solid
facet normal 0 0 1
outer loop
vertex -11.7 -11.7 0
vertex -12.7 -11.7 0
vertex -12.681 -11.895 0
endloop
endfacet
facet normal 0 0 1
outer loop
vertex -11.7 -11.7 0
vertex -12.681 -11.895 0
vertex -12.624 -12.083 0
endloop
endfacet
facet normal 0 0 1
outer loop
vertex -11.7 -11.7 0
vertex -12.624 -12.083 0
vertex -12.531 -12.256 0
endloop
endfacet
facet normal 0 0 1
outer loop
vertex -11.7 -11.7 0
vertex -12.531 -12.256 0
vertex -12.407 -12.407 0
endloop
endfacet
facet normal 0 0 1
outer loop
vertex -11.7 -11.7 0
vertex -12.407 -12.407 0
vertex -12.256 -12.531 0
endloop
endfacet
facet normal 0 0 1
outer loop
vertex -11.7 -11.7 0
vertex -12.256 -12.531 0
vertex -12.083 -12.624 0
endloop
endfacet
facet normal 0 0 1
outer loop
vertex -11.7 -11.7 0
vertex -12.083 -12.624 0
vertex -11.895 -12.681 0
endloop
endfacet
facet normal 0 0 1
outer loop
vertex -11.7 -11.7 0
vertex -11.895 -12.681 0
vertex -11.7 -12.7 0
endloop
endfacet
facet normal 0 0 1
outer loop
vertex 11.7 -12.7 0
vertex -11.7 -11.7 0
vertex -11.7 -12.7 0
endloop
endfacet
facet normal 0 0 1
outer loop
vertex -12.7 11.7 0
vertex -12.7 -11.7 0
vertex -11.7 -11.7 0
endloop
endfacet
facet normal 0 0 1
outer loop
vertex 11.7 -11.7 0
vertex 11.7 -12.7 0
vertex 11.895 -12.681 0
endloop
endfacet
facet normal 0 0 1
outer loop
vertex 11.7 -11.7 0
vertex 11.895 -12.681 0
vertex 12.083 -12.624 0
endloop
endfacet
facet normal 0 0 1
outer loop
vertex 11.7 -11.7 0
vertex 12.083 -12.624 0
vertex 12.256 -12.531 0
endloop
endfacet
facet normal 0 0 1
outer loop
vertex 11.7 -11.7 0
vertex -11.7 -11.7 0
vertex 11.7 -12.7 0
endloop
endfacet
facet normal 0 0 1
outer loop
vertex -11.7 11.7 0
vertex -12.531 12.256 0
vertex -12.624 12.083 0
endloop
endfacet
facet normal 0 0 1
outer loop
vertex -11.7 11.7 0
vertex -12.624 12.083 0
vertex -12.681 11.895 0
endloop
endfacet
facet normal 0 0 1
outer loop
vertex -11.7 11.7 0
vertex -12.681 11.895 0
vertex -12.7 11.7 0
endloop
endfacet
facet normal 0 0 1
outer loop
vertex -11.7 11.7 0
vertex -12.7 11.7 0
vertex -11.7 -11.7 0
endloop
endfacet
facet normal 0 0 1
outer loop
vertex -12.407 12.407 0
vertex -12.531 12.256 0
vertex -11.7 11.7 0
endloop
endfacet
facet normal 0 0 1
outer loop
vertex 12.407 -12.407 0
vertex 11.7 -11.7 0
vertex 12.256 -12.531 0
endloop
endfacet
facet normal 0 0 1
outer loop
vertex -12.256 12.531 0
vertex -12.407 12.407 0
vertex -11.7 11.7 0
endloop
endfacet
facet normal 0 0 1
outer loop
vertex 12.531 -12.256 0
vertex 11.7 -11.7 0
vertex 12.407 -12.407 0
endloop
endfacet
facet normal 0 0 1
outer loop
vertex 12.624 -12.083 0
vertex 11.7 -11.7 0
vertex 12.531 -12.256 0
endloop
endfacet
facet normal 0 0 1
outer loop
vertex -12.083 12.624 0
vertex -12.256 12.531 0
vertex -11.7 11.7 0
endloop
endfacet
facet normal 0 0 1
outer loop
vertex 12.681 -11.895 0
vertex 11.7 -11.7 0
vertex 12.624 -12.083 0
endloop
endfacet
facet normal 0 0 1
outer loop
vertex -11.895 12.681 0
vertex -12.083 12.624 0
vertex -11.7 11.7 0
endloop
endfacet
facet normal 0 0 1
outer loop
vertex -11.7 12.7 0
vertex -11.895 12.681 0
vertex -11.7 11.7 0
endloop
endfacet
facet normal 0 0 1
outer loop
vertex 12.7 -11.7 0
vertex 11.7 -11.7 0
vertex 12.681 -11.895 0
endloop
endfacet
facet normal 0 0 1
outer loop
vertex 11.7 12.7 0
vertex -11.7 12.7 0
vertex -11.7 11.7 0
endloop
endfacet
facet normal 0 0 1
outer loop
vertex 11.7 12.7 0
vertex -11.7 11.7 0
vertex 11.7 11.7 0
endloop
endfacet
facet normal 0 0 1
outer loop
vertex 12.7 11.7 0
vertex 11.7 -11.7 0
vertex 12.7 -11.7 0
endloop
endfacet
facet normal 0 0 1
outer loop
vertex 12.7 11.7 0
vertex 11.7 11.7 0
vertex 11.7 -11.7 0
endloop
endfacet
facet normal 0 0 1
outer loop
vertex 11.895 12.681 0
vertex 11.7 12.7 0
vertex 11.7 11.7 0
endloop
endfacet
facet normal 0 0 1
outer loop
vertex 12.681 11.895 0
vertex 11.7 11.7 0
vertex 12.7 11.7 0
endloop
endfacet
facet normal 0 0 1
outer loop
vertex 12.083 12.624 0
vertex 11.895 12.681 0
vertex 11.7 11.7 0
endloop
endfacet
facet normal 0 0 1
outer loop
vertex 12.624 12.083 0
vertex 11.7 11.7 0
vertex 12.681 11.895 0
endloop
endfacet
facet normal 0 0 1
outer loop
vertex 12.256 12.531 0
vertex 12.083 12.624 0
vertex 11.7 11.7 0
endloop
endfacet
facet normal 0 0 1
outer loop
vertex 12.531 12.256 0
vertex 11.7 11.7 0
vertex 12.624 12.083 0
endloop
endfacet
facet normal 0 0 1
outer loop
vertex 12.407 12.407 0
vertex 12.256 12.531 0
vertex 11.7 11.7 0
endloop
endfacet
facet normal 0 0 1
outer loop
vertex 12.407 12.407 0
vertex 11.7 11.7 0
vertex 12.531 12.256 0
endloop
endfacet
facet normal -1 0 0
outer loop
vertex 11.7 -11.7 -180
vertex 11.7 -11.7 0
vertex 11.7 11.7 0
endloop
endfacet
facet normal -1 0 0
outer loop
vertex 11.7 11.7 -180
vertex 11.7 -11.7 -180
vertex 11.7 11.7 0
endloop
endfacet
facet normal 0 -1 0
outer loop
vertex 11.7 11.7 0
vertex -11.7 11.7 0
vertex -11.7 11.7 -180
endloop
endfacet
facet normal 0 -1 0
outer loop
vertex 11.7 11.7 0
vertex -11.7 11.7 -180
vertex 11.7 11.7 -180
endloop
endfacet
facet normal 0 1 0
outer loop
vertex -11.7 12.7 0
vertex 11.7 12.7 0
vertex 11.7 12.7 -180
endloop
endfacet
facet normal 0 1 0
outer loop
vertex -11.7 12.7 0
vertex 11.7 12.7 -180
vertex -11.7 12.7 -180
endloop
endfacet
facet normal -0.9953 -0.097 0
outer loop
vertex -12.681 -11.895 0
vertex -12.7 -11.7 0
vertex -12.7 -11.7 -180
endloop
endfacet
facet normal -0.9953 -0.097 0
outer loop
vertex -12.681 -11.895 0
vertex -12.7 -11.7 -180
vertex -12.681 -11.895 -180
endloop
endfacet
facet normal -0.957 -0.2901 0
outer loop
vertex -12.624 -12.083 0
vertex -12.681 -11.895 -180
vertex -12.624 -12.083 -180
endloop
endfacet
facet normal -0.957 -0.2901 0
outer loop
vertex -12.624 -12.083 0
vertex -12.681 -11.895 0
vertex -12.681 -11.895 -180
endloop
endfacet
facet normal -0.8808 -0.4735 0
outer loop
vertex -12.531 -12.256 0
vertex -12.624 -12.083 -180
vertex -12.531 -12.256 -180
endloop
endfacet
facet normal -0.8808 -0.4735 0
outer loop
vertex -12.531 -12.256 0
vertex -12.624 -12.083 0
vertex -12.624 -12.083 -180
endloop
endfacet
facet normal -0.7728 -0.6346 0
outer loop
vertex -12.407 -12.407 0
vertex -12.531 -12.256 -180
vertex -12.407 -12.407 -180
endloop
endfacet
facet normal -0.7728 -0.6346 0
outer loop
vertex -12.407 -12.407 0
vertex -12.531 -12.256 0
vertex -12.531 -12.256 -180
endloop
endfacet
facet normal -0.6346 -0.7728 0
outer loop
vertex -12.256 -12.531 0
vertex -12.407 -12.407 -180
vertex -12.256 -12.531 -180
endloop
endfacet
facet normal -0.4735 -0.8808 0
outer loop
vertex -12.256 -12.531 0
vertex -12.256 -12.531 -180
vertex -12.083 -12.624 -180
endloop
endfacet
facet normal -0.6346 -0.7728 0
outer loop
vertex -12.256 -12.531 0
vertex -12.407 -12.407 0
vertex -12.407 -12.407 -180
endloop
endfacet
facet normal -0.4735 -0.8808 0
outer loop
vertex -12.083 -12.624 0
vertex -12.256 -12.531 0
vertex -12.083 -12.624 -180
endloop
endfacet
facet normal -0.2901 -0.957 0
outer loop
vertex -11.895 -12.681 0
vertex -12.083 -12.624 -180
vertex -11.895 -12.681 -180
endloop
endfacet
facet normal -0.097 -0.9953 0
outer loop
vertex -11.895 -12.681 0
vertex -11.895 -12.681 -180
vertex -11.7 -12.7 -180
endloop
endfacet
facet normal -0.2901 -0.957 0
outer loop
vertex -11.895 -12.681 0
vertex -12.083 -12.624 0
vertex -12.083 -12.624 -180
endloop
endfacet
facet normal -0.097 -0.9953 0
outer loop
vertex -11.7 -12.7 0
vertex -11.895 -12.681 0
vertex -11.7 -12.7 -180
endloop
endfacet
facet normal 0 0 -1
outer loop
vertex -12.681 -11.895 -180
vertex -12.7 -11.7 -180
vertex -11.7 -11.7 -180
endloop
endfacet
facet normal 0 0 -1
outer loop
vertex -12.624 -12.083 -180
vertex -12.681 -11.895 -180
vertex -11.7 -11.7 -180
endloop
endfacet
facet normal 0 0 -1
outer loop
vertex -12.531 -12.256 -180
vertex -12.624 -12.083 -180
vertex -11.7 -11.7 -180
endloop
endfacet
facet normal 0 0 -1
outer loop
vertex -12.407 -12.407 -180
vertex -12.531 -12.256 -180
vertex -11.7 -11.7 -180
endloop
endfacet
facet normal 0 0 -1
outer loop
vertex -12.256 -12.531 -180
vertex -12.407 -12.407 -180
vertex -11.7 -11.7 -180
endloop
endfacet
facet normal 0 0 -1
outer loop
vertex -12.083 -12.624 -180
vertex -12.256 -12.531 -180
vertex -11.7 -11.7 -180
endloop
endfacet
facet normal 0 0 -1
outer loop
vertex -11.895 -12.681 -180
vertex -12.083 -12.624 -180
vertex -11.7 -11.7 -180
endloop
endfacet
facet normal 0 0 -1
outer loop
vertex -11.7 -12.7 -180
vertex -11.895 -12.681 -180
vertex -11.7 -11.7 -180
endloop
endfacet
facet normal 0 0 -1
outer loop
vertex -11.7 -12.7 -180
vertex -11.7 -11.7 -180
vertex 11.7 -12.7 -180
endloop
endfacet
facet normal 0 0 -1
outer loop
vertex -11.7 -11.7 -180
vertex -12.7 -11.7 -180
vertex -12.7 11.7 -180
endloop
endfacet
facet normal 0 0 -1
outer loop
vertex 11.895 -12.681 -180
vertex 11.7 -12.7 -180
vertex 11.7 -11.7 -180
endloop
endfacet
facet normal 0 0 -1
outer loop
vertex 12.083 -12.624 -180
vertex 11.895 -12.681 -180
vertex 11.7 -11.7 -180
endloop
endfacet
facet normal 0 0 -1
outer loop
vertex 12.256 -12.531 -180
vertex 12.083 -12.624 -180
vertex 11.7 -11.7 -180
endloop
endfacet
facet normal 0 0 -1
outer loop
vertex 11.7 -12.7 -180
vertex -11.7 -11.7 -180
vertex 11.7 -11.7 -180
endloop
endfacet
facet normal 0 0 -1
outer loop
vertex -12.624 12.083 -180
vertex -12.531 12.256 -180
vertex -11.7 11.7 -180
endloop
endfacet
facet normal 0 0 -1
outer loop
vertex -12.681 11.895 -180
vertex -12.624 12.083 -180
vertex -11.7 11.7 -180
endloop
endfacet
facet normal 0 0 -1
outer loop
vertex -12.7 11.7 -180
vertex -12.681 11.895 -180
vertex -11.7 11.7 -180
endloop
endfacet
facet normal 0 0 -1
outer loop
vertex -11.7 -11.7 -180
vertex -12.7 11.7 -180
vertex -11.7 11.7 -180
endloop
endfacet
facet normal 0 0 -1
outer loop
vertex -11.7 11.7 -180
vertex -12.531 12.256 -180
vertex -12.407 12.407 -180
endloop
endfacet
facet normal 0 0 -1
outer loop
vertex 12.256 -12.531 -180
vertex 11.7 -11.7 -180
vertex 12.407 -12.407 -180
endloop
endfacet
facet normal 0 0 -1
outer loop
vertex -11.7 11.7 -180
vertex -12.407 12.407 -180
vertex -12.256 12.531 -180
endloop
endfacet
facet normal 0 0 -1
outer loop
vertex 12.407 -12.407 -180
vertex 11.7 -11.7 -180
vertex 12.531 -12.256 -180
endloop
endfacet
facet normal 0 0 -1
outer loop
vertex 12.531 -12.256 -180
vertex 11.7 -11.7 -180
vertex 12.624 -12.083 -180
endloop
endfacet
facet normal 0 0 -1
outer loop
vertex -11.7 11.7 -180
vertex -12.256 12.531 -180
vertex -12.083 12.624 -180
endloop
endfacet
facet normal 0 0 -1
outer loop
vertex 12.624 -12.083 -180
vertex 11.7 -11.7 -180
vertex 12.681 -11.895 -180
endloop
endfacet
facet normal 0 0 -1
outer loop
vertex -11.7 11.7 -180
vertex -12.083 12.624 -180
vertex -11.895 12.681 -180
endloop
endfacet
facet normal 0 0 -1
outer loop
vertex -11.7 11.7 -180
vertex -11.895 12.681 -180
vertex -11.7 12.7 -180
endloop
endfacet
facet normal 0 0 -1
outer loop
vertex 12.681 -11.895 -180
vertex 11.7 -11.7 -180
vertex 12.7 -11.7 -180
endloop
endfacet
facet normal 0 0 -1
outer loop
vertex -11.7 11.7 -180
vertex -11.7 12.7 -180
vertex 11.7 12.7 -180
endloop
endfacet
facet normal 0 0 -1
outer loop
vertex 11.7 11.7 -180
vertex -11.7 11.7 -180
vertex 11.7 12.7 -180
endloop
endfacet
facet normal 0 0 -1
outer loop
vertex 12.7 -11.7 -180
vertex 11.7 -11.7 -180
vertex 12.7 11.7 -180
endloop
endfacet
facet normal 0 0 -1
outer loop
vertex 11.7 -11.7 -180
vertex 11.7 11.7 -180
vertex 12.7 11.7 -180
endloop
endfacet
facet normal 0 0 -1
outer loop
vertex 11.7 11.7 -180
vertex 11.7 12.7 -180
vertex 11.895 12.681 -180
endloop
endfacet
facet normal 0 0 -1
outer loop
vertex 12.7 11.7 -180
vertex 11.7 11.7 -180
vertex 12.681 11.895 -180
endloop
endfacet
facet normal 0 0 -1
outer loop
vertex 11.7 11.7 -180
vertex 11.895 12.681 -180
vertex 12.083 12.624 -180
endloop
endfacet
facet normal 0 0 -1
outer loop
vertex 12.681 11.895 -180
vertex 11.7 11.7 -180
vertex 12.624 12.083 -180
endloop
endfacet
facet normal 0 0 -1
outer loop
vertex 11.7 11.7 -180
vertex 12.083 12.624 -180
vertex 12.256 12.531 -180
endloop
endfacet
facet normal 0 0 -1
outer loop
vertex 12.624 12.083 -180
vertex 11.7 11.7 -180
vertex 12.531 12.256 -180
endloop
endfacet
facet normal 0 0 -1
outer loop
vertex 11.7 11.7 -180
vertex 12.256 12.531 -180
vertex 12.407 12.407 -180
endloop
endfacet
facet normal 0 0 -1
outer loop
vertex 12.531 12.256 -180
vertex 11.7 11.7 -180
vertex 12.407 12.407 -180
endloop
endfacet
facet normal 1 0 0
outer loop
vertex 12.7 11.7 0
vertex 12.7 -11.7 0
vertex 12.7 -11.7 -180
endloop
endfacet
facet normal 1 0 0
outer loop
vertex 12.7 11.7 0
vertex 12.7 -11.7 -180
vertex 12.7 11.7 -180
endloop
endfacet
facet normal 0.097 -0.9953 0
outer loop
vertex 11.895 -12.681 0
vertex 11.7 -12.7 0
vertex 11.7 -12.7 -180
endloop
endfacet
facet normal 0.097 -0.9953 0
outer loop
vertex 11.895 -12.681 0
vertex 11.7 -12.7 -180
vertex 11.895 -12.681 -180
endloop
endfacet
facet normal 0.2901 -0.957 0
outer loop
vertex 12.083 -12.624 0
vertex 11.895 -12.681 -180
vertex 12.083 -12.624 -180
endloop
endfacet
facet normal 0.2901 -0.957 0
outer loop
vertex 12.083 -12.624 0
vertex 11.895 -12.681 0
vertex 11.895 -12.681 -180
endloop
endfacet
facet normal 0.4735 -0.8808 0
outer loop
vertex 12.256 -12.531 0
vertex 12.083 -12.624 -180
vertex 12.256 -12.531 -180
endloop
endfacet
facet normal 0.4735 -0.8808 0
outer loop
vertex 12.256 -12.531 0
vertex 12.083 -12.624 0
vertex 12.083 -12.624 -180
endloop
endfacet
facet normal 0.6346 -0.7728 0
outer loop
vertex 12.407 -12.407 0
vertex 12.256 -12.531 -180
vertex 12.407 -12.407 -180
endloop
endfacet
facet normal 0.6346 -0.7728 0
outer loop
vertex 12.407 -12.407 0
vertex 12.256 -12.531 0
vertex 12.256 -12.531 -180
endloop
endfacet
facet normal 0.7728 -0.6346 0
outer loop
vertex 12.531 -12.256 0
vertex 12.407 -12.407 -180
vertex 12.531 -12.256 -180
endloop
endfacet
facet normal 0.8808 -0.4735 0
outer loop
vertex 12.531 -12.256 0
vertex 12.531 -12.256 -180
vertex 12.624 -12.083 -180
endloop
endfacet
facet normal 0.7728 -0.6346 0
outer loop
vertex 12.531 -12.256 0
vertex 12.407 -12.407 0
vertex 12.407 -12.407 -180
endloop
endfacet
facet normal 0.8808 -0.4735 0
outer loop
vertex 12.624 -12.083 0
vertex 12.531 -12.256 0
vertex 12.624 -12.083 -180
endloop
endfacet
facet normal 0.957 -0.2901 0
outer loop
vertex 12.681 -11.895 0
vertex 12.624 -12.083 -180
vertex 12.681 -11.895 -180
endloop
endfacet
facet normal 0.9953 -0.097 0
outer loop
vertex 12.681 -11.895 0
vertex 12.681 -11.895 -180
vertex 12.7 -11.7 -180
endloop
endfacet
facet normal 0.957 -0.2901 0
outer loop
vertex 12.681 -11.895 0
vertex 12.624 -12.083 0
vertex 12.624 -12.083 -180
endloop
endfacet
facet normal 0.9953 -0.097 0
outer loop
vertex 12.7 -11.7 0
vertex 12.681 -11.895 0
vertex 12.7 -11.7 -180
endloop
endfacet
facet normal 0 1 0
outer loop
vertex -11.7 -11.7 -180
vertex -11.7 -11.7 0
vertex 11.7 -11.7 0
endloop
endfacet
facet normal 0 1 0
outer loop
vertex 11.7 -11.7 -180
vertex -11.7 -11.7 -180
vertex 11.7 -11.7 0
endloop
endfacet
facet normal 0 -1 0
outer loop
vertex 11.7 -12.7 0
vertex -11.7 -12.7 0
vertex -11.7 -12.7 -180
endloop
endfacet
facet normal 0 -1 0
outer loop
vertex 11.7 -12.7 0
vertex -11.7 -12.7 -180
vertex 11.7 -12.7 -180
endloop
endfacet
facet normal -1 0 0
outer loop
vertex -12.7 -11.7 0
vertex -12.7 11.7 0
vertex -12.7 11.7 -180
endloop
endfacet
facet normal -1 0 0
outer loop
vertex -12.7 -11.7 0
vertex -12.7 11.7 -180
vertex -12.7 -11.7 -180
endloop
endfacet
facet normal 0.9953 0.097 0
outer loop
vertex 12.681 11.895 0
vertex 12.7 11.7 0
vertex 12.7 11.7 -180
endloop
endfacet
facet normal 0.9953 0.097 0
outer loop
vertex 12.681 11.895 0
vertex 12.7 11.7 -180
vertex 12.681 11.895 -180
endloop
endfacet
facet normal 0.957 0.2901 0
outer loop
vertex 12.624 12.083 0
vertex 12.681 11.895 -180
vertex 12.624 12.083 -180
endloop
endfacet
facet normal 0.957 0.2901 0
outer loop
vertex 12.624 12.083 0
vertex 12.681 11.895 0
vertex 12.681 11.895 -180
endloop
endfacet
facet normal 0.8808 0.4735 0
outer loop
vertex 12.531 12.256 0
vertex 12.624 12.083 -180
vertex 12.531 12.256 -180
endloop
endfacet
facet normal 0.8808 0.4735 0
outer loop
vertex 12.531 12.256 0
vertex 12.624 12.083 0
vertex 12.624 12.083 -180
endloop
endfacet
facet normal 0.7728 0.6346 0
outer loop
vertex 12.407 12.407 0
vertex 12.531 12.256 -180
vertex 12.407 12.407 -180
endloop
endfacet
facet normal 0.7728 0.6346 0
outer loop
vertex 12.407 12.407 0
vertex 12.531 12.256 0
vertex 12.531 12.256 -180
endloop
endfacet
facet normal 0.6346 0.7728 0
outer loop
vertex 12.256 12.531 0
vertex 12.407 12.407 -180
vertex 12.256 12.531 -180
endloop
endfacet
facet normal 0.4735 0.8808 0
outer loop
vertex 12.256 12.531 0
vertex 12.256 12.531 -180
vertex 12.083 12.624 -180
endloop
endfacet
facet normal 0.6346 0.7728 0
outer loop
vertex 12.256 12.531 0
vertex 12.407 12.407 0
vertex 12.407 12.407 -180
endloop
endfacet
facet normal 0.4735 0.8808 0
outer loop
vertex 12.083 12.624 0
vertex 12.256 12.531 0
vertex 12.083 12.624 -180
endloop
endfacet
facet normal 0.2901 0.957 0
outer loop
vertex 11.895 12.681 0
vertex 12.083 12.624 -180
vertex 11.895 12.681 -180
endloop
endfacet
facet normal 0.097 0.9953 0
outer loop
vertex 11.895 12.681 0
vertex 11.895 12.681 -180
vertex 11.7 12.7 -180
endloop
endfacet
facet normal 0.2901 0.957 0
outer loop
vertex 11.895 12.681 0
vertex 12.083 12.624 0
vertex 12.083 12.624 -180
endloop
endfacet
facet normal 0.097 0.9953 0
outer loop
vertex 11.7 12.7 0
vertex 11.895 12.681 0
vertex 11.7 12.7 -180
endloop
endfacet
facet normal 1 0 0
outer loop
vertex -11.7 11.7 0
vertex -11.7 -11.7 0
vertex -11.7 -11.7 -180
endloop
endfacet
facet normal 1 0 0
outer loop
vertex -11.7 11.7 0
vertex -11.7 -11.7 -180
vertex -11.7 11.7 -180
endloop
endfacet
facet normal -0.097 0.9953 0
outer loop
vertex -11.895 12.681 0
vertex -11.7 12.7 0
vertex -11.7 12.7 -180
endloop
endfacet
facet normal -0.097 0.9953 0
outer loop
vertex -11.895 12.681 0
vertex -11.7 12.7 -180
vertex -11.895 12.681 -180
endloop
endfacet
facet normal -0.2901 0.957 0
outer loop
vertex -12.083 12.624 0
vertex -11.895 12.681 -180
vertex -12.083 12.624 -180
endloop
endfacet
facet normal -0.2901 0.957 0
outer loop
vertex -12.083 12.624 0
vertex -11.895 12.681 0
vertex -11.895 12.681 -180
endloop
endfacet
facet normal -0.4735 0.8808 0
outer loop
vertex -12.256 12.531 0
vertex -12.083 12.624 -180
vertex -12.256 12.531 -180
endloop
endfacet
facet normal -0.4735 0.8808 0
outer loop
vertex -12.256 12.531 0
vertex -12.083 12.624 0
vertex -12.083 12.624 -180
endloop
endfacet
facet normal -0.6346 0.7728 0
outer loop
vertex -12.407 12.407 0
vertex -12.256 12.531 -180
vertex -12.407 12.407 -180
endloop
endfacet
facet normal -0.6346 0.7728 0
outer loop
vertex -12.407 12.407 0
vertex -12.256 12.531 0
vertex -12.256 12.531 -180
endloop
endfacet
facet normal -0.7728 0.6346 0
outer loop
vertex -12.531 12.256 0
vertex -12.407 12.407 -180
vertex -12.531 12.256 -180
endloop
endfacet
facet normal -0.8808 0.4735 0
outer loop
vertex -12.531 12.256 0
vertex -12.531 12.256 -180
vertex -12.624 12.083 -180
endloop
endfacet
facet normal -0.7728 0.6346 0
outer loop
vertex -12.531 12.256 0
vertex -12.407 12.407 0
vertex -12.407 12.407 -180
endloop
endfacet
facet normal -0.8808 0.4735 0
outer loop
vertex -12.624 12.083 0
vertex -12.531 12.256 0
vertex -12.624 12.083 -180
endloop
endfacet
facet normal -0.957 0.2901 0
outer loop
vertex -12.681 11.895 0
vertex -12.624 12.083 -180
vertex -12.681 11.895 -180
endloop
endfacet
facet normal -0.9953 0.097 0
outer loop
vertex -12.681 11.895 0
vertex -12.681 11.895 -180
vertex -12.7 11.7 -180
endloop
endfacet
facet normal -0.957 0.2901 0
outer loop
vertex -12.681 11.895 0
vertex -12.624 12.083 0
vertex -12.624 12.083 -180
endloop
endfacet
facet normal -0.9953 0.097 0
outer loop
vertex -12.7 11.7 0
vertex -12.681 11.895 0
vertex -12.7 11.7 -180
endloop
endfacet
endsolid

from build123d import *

# Parameters (mm, degrees)
CROQUIS1_W              = 23.4
CROQUIS1_H              = 23.4
SALIENTE_EXTRUIR1_DEPTH = 180


with BuildPart() as part:
    # Croquis1 → Saliente-Extruir1 (new body)
    with BuildSketch(Plane.XY):
        with BuildLine():
            Line((-11.7, -12.7), (11.7, -12.7))
            ThreePointArc((11.7, -12.7), (12.407106781, -12.407106781), (12.7, -11.7))
            Line((12.7, -11.7), (12.7, 11.7))
            ThreePointArc((12.7, 11.7), (12.407106781, 12.407106781), (11.7, 12.7))
            Line((11.7, 12.7), (-11.7, 12.7))
            ThreePointArc((-11.7, 12.7), (-12.407106781, 12.407106781), (-12.7, 11.7))
            Line((-12.7, 11.7), (-12.7, -11.7))
            ThreePointArc((-12.7, -11.7), (-12.407106781, -12.407106781), (-11.7, -12.7))
        make_face()
        Rectangle(CROQUIS1_W, CROQUIS1_H, mode=Mode.SUBTRACT)
    extrude(amount=-SALIENTE_EXTRUIR1_DEPTH)


solid = part.part
